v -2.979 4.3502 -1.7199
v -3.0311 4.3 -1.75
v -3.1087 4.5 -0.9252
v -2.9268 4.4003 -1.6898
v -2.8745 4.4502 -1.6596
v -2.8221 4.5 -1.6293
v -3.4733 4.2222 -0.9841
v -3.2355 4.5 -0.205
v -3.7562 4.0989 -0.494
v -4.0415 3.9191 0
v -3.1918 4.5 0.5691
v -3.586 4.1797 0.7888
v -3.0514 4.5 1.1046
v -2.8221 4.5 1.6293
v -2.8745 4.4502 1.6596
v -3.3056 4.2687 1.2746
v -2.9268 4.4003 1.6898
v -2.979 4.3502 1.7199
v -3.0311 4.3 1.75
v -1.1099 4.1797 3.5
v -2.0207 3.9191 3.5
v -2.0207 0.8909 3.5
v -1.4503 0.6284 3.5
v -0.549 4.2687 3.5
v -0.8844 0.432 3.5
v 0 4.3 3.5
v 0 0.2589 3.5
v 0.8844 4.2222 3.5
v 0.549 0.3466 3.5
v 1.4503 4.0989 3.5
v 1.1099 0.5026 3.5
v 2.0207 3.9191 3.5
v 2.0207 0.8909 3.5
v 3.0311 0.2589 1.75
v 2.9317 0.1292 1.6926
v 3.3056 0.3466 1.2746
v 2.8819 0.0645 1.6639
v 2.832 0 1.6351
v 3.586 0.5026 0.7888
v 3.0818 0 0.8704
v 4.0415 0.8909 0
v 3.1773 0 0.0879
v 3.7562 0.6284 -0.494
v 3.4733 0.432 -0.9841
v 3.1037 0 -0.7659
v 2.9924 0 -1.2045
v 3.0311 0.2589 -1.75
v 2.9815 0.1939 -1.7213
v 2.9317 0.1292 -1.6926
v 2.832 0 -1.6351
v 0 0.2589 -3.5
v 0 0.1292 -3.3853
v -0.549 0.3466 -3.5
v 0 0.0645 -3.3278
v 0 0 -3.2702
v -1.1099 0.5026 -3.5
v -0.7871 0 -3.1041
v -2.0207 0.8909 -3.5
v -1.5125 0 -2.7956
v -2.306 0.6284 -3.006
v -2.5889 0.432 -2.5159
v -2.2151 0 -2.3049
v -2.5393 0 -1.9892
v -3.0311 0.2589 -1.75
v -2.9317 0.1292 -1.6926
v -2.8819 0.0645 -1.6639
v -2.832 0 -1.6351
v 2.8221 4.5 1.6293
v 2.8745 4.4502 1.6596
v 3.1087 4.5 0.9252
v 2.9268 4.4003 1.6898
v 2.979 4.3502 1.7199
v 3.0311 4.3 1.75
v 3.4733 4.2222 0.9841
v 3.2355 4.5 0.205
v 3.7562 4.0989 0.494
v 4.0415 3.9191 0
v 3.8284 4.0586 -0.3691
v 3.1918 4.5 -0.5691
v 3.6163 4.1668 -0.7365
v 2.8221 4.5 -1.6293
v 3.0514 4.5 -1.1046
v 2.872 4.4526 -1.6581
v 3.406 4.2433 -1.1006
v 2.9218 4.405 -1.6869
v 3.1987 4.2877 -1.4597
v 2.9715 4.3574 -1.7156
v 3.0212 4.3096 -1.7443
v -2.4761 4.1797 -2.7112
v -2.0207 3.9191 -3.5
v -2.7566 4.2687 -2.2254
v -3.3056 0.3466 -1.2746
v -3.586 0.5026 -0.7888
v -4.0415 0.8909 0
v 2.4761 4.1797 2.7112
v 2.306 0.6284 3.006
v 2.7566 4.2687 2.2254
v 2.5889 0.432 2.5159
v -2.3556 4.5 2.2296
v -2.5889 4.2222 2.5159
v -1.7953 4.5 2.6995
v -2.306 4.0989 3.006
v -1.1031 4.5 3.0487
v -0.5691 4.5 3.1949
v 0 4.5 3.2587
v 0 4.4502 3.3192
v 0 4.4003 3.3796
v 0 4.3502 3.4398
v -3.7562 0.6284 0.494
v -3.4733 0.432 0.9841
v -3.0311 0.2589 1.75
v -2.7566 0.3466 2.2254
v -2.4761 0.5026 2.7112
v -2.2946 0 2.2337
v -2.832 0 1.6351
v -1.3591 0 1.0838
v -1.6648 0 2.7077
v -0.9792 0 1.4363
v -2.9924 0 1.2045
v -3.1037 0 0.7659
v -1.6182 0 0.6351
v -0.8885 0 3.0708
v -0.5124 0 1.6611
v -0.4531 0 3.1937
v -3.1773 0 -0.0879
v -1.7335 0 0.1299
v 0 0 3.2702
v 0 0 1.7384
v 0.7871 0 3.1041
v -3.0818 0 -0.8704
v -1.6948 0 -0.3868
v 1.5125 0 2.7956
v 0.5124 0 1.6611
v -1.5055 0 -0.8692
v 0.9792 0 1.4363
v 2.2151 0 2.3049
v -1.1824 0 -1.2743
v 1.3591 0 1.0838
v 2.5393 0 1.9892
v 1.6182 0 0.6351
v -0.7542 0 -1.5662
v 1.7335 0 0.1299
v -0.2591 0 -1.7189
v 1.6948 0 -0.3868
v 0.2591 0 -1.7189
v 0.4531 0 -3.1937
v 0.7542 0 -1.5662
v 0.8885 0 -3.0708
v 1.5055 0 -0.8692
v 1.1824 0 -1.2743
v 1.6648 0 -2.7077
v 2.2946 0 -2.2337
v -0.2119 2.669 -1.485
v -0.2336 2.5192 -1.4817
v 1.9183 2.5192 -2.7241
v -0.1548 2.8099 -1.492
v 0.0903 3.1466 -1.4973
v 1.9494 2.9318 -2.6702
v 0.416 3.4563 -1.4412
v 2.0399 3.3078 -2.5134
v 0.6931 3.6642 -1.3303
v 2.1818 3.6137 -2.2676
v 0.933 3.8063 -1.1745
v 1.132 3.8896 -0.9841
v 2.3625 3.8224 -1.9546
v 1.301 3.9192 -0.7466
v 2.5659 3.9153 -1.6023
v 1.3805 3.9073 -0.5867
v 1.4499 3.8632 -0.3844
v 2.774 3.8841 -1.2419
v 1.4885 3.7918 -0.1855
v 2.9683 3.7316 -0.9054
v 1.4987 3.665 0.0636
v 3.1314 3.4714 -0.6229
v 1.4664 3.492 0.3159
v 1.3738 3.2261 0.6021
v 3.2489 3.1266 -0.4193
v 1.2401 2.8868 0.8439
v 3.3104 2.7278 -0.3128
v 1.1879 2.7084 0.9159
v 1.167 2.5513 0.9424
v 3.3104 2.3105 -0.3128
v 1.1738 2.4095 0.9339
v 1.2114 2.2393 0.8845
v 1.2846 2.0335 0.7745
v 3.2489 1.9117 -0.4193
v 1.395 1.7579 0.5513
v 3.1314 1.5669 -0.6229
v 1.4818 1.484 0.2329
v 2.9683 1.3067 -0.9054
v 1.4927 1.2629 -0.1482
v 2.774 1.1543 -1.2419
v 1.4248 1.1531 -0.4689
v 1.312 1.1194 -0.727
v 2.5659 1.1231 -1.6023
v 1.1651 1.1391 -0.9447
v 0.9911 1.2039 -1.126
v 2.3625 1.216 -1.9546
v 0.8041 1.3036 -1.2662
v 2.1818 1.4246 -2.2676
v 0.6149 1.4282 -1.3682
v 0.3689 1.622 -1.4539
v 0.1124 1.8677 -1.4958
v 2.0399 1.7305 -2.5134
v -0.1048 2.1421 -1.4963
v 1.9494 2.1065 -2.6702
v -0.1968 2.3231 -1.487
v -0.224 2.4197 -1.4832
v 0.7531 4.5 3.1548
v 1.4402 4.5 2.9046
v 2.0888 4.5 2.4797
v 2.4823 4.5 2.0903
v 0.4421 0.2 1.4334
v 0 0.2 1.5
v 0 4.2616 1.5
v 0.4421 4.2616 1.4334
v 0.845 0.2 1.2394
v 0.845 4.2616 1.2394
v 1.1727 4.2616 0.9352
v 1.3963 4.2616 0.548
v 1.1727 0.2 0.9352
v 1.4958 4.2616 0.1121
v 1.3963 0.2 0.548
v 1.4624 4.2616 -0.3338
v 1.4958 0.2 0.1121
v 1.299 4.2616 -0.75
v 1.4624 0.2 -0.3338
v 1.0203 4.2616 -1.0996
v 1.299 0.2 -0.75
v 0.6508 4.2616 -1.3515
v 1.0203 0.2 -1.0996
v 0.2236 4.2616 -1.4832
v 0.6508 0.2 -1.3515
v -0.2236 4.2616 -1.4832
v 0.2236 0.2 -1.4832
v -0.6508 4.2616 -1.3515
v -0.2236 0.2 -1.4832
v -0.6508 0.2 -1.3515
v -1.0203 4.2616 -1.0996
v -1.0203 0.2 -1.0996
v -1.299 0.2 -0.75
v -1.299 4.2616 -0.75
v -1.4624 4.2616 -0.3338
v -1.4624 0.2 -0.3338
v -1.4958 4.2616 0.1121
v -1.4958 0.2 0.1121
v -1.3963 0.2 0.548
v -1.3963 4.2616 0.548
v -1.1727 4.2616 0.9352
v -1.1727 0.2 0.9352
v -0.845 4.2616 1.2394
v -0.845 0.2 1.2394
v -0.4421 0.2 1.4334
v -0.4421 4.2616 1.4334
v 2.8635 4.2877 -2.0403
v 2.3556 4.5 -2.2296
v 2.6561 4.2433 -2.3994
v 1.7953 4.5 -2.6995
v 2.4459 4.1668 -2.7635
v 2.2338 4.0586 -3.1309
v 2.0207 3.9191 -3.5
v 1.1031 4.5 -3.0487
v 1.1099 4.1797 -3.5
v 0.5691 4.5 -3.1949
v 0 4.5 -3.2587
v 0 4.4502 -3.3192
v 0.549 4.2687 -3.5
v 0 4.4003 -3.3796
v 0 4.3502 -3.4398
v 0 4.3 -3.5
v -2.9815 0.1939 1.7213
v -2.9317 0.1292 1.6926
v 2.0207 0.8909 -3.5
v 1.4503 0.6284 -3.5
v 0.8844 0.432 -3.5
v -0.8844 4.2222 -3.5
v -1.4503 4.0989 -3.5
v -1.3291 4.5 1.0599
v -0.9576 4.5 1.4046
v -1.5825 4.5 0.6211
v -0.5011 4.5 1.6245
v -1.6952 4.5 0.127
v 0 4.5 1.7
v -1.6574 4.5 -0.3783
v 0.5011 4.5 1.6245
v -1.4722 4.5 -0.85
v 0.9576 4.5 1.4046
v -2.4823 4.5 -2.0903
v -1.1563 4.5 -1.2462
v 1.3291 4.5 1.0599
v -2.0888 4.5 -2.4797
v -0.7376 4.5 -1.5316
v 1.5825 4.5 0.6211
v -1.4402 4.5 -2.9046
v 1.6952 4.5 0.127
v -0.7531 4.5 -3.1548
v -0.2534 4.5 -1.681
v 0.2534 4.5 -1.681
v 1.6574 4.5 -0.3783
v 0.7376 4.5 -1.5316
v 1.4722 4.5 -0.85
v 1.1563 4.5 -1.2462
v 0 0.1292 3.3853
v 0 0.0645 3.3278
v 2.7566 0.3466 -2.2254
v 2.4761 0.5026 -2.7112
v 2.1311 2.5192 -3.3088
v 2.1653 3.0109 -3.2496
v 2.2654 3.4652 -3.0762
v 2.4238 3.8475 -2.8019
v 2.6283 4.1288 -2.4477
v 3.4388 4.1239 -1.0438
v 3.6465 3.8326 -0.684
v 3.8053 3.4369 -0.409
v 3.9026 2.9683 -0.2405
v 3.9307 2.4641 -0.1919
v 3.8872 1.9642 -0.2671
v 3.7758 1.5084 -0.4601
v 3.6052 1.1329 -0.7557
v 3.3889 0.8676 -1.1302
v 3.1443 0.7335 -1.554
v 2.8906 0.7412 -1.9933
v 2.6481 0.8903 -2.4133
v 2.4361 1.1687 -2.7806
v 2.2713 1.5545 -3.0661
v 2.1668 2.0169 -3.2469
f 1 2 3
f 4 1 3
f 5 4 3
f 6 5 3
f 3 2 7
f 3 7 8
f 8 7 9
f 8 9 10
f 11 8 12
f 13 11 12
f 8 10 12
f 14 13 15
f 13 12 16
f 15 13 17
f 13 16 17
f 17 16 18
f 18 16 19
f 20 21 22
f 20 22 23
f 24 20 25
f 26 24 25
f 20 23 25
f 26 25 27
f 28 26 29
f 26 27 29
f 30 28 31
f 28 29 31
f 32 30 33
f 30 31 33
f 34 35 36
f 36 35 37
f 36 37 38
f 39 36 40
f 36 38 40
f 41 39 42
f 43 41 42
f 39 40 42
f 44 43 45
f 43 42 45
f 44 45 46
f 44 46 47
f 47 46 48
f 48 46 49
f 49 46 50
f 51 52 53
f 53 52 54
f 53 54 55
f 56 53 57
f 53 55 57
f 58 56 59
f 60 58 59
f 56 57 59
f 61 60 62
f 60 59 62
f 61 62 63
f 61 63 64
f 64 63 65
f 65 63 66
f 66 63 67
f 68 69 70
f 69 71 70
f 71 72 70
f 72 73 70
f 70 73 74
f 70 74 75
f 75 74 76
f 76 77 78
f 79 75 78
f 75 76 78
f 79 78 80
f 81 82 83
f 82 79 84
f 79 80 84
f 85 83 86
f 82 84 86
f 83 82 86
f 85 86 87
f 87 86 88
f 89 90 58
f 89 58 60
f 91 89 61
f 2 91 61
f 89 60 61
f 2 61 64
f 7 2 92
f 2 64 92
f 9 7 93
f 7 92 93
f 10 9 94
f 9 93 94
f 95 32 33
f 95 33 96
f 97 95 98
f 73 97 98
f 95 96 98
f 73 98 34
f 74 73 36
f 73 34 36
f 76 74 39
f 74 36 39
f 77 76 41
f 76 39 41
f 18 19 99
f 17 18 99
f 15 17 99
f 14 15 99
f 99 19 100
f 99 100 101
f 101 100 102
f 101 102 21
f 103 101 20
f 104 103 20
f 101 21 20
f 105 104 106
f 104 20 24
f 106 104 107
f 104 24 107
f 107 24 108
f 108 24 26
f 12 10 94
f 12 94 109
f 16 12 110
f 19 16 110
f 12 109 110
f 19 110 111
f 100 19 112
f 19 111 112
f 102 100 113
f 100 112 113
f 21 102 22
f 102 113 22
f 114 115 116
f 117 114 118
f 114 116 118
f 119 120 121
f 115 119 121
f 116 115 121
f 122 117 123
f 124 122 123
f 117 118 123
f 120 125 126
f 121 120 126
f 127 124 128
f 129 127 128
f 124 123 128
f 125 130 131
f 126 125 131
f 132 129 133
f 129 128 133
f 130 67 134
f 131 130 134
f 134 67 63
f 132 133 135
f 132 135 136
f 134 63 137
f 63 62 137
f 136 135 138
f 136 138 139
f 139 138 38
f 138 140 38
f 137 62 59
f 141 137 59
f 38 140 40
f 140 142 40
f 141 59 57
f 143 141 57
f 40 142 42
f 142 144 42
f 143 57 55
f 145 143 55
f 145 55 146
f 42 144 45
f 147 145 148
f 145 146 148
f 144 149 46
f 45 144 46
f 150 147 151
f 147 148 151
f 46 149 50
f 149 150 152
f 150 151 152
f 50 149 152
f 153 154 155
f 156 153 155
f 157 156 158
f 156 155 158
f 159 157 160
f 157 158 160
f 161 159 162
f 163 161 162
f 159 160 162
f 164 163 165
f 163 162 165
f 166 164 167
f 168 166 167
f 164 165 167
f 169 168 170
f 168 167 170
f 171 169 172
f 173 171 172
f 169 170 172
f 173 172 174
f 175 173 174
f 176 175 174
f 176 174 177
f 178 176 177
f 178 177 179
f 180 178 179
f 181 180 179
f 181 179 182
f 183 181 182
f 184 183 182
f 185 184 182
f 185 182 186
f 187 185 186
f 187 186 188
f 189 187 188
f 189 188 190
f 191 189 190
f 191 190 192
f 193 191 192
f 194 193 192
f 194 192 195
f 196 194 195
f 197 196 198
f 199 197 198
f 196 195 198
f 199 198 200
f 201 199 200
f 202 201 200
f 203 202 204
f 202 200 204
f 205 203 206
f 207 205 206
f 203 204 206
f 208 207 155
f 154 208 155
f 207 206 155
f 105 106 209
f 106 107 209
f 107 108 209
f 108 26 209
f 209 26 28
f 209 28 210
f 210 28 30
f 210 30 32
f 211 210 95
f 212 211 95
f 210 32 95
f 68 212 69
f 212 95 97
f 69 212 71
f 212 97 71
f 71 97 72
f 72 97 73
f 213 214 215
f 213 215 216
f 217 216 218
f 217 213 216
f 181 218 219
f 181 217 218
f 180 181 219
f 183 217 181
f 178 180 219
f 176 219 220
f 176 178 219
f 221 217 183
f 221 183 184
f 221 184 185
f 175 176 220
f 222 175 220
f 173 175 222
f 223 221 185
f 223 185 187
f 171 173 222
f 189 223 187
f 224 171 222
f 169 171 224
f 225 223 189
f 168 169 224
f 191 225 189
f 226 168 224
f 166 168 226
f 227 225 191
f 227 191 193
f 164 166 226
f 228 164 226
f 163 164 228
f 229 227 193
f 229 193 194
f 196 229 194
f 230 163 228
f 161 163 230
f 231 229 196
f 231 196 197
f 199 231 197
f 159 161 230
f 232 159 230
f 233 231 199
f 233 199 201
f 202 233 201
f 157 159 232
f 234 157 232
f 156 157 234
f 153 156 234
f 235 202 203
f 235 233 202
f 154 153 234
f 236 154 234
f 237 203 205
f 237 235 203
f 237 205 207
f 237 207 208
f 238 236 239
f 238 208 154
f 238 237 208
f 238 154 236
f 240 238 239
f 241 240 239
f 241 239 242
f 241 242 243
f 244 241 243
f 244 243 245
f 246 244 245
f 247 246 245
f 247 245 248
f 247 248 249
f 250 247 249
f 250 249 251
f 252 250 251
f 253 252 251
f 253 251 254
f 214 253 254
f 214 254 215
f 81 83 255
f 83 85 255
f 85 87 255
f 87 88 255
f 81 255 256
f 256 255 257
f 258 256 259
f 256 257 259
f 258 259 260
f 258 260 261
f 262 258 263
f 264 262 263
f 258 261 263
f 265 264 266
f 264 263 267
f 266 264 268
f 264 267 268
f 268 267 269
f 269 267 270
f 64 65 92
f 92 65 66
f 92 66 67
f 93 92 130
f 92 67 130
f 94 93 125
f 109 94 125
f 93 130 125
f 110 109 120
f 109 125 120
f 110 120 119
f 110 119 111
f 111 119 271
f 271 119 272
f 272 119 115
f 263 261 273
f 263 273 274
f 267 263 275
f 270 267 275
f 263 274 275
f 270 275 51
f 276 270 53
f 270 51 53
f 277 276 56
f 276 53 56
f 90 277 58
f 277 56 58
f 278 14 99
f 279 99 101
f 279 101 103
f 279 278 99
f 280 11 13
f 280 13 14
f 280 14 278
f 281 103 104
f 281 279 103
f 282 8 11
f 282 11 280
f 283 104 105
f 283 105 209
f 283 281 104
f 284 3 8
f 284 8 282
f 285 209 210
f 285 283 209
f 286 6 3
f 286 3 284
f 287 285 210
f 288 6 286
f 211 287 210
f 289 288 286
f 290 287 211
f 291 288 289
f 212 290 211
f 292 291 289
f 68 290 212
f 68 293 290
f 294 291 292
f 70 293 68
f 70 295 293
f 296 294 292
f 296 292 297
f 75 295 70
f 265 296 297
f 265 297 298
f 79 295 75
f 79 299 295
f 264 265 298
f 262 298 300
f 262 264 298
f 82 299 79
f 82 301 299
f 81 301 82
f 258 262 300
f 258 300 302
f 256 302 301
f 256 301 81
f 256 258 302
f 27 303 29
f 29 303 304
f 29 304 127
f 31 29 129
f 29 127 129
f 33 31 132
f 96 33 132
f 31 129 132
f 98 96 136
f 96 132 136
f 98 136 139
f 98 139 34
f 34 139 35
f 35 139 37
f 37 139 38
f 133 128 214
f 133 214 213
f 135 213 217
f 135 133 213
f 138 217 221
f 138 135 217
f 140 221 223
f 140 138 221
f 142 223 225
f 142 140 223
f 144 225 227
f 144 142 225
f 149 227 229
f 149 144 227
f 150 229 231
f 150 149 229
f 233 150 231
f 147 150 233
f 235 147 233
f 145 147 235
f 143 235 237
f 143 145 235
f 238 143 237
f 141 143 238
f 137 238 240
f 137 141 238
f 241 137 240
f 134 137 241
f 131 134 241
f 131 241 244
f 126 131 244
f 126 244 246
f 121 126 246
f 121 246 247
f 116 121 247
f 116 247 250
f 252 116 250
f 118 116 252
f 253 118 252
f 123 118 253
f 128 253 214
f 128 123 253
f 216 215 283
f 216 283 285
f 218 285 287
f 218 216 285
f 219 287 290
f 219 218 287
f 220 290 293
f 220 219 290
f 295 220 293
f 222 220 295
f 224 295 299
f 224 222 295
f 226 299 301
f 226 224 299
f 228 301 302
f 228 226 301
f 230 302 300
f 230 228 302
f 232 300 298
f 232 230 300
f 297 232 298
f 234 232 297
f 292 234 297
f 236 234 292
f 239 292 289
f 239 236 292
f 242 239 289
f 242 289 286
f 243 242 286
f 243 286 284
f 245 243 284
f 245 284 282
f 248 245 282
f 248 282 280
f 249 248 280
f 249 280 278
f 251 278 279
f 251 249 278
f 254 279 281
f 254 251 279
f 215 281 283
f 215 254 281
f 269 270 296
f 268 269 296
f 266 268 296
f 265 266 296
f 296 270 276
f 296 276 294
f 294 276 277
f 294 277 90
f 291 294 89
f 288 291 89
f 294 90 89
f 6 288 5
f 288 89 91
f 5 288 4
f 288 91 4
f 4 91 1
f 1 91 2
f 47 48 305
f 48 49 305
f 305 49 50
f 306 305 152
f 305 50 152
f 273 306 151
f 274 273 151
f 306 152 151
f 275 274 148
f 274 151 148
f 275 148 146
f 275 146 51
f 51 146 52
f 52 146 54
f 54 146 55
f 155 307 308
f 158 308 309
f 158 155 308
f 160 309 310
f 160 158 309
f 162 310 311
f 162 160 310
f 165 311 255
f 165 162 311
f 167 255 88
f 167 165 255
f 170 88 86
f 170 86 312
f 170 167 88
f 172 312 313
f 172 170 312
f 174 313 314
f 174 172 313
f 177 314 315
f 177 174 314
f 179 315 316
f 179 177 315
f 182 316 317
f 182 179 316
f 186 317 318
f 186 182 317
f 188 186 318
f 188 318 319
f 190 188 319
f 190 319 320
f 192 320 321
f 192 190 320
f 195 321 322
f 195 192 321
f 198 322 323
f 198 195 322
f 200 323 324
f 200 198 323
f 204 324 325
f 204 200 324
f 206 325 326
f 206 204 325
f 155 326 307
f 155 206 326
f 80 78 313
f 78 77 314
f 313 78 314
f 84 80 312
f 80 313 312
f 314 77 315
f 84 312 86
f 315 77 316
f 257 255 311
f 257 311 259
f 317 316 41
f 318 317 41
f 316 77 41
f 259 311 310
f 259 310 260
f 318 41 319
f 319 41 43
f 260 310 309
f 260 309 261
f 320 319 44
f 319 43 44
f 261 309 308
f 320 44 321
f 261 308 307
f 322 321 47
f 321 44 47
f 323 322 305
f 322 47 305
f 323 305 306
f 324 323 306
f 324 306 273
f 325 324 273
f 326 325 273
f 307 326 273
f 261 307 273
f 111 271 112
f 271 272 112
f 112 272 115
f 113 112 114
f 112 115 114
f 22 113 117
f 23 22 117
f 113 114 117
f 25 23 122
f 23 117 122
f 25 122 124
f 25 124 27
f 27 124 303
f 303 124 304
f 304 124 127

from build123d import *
from OCP.BRepFilletAPI import BRepFilletAPI_MakeChamfer

# Parameters (mm, degrees)
SKETCH1_R           = 1.5
BOSS_EXTRUDE1_DEPTH = 4.5
CHAMFER1_SIZE       = 0.2
CHAMFER1_SIZE2      = 0.238350719
SKETCH2_R           = 1.4
CUT_EXTRUDE1_DEPTH  = 3
CHAMFER2_SIZE       = 0.4
CHAMFER2_SIZE_2     = 0.476701437
FILLET1_R           = 5.5


with BuildPart() as part:
    # Sketch1 → Boss-Extrude1 (new body)
    with BuildSketch(Plane(origin=(0, 0, 0), x_dir=(1, 0, 0), z_dir=(0, 1, 0))):
        Polygon((4.041451884, 0), (2.020725942, 3.5), (-2.020725942, 3.5), (-4.041451884, 0), (-2.020725942, -3.5), (2.020725942, -3.5), align=None)
        with Locations(Location((0, 0, 0), (0, 0, 270))):
            Circle(SKETCH1_R, mode=Mode.SUBTRACT)
    extrude(amount=BOSS_EXTRUDE1_DEPTH)

    # Chamfer1: one chamfer whose edges measure the first distance from different faces: ONE call of the kernel's chamfer builder (chamfer() names one face for all edges)
    chamfer1_edges_1 = [part.edges().sort_by_distance(p)[0] for p in [
        (0, 4.5, -3.5),
    ]]
    chamfer1_side_1 = [part.faces().sort_by_distance(p)[0] for p in [
        (0, 2.25, -3.5),
    ]]
    chamfer1_edges_2 = [part.edges().sort_by_distance(p)[0] for p in [
        (-3.031088913, 4.5, -1.75),
    ]]
    chamfer1_side_2 = [part.faces().sort_by_distance(p)[0] for p in [
        (-3.031088913, 2.25, -1.75),
    ]]
    chamfer1_edges_3 = [part.edges().sort_by_distance(p)[0] for p in [
        (-3.031088913, 4.5, 1.75),
    ]]
    chamfer1_side_3 = [part.faces().sort_by_distance(p)[0] for p in [
        (-3.031088913, 2.25, 1.75),
    ]]
    chamfer1_edges_4 = [part.edges().sort_by_distance(p)[0] for p in [
        (0, 0, -1.5),
    ]]
    chamfer1_side_4 = [part.faces().sort_by_distance(p)[0] for p in [
        (0, 2.25, -1.5),
    ]]
    chamfer1_edges_5 = [part.edges().sort_by_distance(p)[0] for p in [
        (0, 4.5, -1.5),
    ]]
    chamfer1_side_5 = [part.faces().sort_by_distance(p)[0] for p in [
        (2.938487617, 4.5, -1.696536617),
    ]]
    chamfer1_edges_6 = [part.edges().sort_by_distance(p)[0] for p in [
        (0, 4.5, 3.5),
    ]]
    chamfer1_side_6 = [part.faces().sort_by_distance(p)[0] for p in [
        (0, 2.25, 3.5),
    ]]
    chamfer1_edges_7 = [part.edges().sort_by_distance(p)[0] for p in [
        (3.031088913, 4.5, 1.75),
    ]]
    chamfer1_side_7 = [part.faces().sort_by_distance(p)[0] for p in [
        (3.031088913, 2.25, 1.75),
    ]]
    chamfer1_edges_8 = [part.edges().sort_by_distance(p)[0] for p in [
        (0, 0, 3.5),
        (-3.031088913, 0, 1.75),
        (-3.031088913, 0, -1.75),
        (0, 0, -3.5),
        (3.031088913, 0, -1.75),
        (3.031088913, 0, 1.75),
    ]]
    chamfer1_side_8 = [part.faces().sort_by_distance(p)[0] for p in [
        (2.938487617, 0, -1.696536617),
    ]]
    chamfer1_edges_9 = [part.edges().sort_by_distance(p)[0] for p in [
        (3.031088913, 4.5, -1.75),
    ]]
    chamfer1_side_9 = [part.faces().sort_by_distance(p)[0] for p in [
        (3.031088913, 2.25, -1.75),
    ]]
    chamfer1 = BRepFilletAPI_MakeChamfer(part.part.solid().wrapped)
    for e in chamfer1_edges_1:
        chamfer1.Add(CHAMFER1_SIZE, CHAMFER1_SIZE2, e.wrapped, chamfer1_side_1[0].wrapped)  # the first distance lies on this face
    for e in chamfer1_edges_2:
        chamfer1.Add(CHAMFER1_SIZE, CHAMFER1_SIZE2, e.wrapped, chamfer1_side_2[0].wrapped)  # the first distance lies on this face
    for e in chamfer1_edges_3:
        chamfer1.Add(CHAMFER1_SIZE, CHAMFER1_SIZE2, e.wrapped, chamfer1_side_3[0].wrapped)  # the first distance lies on this face
    for e in chamfer1_edges_4:
        chamfer1.Add(CHAMFER1_SIZE, CHAMFER1_SIZE2, e.wrapped, chamfer1_side_4[0].wrapped)  # the first distance lies on this face
    for e in chamfer1_edges_5:
        chamfer1.Add(CHAMFER1_SIZE, CHAMFER1_SIZE2, e.wrapped, chamfer1_side_5[0].wrapped)  # the first distance lies on this face
    for e in chamfer1_edges_6:
        chamfer1.Add(CHAMFER1_SIZE, CHAMFER1_SIZE2, e.wrapped, chamfer1_side_6[0].wrapped)  # the first distance lies on this face
    for e in chamfer1_edges_7:
        chamfer1.Add(CHAMFER1_SIZE, CHAMFER1_SIZE2, e.wrapped, chamfer1_side_7[0].wrapped)  # the first distance lies on this face
    for e in chamfer1_edges_8:
        chamfer1.Add(CHAMFER1_SIZE, CHAMFER1_SIZE2, e.wrapped, chamfer1_side_8[0].wrapped)  # the first distance lies on this face
    for e in chamfer1_edges_9:
        chamfer1.Add(CHAMFER1_SIZE, CHAMFER1_SIZE2, e.wrapped, chamfer1_side_9[0].wrapped)  # the first distance lies on this face
    add(Compound.cast(chamfer1.Shape()), mode=Mode.REPLACE)

    # Sketch2 → Cut-Extrude1 (cut)
    with BuildSketch(Plane(origin=(3.031088913, 0, -1.75), x_dir=(-0.5, 0, -0.8660254037844386), z_dir=(0.8660254037844387, 0, -0.5000000000000001))):
        with Locations((0, 2.519175359)):
            Circle(SKETCH2_R)
    extrude(amount=-CUT_EXTRUDE1_DEPTH, mode=Mode.SUBTRACT)

    # Chamfer2
    # the kernel refuses this chamfer: 0.476701437, 0.4 mm, written as the material it takes off along each edge
    with BuildSketch(Plane(origin=(3.031088913, 2.519175359, -1.75), x_dir=(-0.5000000000000001, 0, -0.8660254037844386), z_dir=(0, -1, 0))) as chamfer2_piece_1:
        Polygon((1.4 + CHAMFER2_SIZE, 0), (1.4, -CHAMFER2_SIZE_2), (1.4, 0), align=None)
    revolve(axis=Axis((3.031088913, 2.519175359, -1.75), (0.8660254037844387, 0, -0.5000000000000001)), mode=Mode.SUBTRACT)

    # Fillet1
    # the kernel refuses this fillet: 5.5 mm, written as the material it takes off along each edge
    with BuildSketch(Plane(origin=(0.15679227, -4.094610415, 0), x_dir=(0.2750801350308494, 0.26652756240167075, 0.9237391286459793), z_dir=(-0.6958540455341976, 0.7181832268395656, -6.118874277733391e-15)), Plane(origin=(-0.15679227, -4.094610415, 0), x_dir=(-0.2750801350308542, 0.2665275624016659, -0.9237391286459793), z_dir=(0.6958540455341957, 0.7181832268395675, 0)), Plane(origin=(-0.078396135, -4.094610415, -0.135786089), x_dir=(0.6624414843616913, 0.266527562401667, -0.7000959493361638), z_dir=(0.347927022767099, 0.7181832268395667, 0.6026272807587874)), Plane(origin=(0.078396135, -4.094610415, -0.135786089), x_dir=(0.937521619392547, 0.2665275624016655, 0.2236431793098164), z_dir=(-0.3479270227670974, 0.718183226839567, 0.6026272807587876))) as fillet1_piece_1:
        with BuildLine():
            CenterArc((FILLET1_R * 0.414643279343, FILLET1_R), FILLET1_R, 224.957975764, 45.042024236)
            Line((-FILLET1_R * 0.292981947048, FILLET1_R * 0.293412044417), (0, 0))
            Line((0, 0), (FILLET1_R * 0.414643279343, 0))
        make_face()
    extrude(amount=11.734570278, mode=Mode.SUBTRACT)
    with BuildSketch(Plane(origin=(0.078396135, -4.094610415, 0.135786089), x_dir=(0.9375216193925491, 0.26652756240166126, -0.22364317930981242), z_dir=(-0.3479270227670917, 0.7181832268395687, -0.602627280758789)), Plane(origin=(-0.078396135, -4.094610415, 0.135786089), x_dir=(0.6624414843616925, 0.2665275624016671, 0.7000959493361628), z_dir=(0.3479270227670974, 0.718183226839567, -0.6026272807587876))) as fillet1_piece_2:
        with BuildLine():
            CenterArc((FILLET1_R * 0.414643279343, -FILLET1_R), FILLET1_R, 90, 45.042024236)
            Line((-FILLET1_R * 0.292981947048, -FILLET1_R * 0.293412044417), (0, 0))
            Line((0, 0), (FILLET1_R * 0.414643279343, 0))
        make_face()
    extrude(amount=11.734570278, mode=Mode.SUBTRACT)
    with BuildSketch(Plane(origin=(3.908343828, 1.556605641, -6.769450083), x_dir=(0.7256118681846667, -0.25999585509227957, 0.6370946335391565), z_dir=(-0.40448174665200637, 0.5878588831525535, 0.7005829359354784)), Plane(origin=(-3.908343828, 1.556605641, -6.769450083), x_dir=(0.9145460713519834, -0.25999585509227496, -0.3098509943658236), z_dir=(0.4044817466520002, 0.5878588831525553, 0.7005829359354805)), Plane(origin=(-7.816687655, 1.556605641, 0), x_dir=(0.18893420316732476, -0.2599958550922833, -0.9469456279049819), z_dir=(0.8089634933040146, 0.5878588831525519, 7.47827698098615e-15))) as fillet1_piece_3:
        with BuildLine():
            CenterArc((FILLET1_R * 0.339400484434, -FILLET1_R), FILLET1_R, 90, 37.494474502)
            Line((-FILLET1_R * 0.269284432231, -FILLET1_R * 0.206587955583), (0, 0))
            Line((0, 0), (FILLET1_R * 0.339400484434, 0))
        make_face()
    extrude(amount=9.673731027, mode=Mode.SUBTRACT)
    with BuildSketch(Plane(origin=(7.816687655, 1.556605641, 0), x_dir=(-0.18893420316731485, -0.2599958550922788, -0.946945627904985), z_dir=(-0.8089634933040131, 0.587858883152554, 0)), Plane(origin=(3.908343828, 1.556605641, 6.769450083), x_dir=(0.7256118681846656, -0.25999585509228007, -0.6370946335391575), z_dir=(-0.40448174665200737, 0.5878588831525533, -0.7005829359354782)), Plane(origin=(-3.908343828, 1.556605641, 6.769450083), x_dir=(0.9145460713519806, -0.25999585509227907, 0.30985099436582814), z_dir=(0.4044817466520063, 0.5878588831525535, -0.7005829359354784))) as fillet1_piece_4:
        with BuildLine():
            CenterArc((FILLET1_R * 0.339400484434, FILLET1_R), FILLET1_R, 232.505525498, 37.494474502)
            Line((-FILLET1_R * 0.269284432231, FILLET1_R * 0.206587955583), (0, 0))
            Line((0, 0), (FILLET1_R * 0.339400484434, 0))
        make_face()
    extrude(amount=9.673731027, mode=Mode.SUBTRACT)


solid = part.part
